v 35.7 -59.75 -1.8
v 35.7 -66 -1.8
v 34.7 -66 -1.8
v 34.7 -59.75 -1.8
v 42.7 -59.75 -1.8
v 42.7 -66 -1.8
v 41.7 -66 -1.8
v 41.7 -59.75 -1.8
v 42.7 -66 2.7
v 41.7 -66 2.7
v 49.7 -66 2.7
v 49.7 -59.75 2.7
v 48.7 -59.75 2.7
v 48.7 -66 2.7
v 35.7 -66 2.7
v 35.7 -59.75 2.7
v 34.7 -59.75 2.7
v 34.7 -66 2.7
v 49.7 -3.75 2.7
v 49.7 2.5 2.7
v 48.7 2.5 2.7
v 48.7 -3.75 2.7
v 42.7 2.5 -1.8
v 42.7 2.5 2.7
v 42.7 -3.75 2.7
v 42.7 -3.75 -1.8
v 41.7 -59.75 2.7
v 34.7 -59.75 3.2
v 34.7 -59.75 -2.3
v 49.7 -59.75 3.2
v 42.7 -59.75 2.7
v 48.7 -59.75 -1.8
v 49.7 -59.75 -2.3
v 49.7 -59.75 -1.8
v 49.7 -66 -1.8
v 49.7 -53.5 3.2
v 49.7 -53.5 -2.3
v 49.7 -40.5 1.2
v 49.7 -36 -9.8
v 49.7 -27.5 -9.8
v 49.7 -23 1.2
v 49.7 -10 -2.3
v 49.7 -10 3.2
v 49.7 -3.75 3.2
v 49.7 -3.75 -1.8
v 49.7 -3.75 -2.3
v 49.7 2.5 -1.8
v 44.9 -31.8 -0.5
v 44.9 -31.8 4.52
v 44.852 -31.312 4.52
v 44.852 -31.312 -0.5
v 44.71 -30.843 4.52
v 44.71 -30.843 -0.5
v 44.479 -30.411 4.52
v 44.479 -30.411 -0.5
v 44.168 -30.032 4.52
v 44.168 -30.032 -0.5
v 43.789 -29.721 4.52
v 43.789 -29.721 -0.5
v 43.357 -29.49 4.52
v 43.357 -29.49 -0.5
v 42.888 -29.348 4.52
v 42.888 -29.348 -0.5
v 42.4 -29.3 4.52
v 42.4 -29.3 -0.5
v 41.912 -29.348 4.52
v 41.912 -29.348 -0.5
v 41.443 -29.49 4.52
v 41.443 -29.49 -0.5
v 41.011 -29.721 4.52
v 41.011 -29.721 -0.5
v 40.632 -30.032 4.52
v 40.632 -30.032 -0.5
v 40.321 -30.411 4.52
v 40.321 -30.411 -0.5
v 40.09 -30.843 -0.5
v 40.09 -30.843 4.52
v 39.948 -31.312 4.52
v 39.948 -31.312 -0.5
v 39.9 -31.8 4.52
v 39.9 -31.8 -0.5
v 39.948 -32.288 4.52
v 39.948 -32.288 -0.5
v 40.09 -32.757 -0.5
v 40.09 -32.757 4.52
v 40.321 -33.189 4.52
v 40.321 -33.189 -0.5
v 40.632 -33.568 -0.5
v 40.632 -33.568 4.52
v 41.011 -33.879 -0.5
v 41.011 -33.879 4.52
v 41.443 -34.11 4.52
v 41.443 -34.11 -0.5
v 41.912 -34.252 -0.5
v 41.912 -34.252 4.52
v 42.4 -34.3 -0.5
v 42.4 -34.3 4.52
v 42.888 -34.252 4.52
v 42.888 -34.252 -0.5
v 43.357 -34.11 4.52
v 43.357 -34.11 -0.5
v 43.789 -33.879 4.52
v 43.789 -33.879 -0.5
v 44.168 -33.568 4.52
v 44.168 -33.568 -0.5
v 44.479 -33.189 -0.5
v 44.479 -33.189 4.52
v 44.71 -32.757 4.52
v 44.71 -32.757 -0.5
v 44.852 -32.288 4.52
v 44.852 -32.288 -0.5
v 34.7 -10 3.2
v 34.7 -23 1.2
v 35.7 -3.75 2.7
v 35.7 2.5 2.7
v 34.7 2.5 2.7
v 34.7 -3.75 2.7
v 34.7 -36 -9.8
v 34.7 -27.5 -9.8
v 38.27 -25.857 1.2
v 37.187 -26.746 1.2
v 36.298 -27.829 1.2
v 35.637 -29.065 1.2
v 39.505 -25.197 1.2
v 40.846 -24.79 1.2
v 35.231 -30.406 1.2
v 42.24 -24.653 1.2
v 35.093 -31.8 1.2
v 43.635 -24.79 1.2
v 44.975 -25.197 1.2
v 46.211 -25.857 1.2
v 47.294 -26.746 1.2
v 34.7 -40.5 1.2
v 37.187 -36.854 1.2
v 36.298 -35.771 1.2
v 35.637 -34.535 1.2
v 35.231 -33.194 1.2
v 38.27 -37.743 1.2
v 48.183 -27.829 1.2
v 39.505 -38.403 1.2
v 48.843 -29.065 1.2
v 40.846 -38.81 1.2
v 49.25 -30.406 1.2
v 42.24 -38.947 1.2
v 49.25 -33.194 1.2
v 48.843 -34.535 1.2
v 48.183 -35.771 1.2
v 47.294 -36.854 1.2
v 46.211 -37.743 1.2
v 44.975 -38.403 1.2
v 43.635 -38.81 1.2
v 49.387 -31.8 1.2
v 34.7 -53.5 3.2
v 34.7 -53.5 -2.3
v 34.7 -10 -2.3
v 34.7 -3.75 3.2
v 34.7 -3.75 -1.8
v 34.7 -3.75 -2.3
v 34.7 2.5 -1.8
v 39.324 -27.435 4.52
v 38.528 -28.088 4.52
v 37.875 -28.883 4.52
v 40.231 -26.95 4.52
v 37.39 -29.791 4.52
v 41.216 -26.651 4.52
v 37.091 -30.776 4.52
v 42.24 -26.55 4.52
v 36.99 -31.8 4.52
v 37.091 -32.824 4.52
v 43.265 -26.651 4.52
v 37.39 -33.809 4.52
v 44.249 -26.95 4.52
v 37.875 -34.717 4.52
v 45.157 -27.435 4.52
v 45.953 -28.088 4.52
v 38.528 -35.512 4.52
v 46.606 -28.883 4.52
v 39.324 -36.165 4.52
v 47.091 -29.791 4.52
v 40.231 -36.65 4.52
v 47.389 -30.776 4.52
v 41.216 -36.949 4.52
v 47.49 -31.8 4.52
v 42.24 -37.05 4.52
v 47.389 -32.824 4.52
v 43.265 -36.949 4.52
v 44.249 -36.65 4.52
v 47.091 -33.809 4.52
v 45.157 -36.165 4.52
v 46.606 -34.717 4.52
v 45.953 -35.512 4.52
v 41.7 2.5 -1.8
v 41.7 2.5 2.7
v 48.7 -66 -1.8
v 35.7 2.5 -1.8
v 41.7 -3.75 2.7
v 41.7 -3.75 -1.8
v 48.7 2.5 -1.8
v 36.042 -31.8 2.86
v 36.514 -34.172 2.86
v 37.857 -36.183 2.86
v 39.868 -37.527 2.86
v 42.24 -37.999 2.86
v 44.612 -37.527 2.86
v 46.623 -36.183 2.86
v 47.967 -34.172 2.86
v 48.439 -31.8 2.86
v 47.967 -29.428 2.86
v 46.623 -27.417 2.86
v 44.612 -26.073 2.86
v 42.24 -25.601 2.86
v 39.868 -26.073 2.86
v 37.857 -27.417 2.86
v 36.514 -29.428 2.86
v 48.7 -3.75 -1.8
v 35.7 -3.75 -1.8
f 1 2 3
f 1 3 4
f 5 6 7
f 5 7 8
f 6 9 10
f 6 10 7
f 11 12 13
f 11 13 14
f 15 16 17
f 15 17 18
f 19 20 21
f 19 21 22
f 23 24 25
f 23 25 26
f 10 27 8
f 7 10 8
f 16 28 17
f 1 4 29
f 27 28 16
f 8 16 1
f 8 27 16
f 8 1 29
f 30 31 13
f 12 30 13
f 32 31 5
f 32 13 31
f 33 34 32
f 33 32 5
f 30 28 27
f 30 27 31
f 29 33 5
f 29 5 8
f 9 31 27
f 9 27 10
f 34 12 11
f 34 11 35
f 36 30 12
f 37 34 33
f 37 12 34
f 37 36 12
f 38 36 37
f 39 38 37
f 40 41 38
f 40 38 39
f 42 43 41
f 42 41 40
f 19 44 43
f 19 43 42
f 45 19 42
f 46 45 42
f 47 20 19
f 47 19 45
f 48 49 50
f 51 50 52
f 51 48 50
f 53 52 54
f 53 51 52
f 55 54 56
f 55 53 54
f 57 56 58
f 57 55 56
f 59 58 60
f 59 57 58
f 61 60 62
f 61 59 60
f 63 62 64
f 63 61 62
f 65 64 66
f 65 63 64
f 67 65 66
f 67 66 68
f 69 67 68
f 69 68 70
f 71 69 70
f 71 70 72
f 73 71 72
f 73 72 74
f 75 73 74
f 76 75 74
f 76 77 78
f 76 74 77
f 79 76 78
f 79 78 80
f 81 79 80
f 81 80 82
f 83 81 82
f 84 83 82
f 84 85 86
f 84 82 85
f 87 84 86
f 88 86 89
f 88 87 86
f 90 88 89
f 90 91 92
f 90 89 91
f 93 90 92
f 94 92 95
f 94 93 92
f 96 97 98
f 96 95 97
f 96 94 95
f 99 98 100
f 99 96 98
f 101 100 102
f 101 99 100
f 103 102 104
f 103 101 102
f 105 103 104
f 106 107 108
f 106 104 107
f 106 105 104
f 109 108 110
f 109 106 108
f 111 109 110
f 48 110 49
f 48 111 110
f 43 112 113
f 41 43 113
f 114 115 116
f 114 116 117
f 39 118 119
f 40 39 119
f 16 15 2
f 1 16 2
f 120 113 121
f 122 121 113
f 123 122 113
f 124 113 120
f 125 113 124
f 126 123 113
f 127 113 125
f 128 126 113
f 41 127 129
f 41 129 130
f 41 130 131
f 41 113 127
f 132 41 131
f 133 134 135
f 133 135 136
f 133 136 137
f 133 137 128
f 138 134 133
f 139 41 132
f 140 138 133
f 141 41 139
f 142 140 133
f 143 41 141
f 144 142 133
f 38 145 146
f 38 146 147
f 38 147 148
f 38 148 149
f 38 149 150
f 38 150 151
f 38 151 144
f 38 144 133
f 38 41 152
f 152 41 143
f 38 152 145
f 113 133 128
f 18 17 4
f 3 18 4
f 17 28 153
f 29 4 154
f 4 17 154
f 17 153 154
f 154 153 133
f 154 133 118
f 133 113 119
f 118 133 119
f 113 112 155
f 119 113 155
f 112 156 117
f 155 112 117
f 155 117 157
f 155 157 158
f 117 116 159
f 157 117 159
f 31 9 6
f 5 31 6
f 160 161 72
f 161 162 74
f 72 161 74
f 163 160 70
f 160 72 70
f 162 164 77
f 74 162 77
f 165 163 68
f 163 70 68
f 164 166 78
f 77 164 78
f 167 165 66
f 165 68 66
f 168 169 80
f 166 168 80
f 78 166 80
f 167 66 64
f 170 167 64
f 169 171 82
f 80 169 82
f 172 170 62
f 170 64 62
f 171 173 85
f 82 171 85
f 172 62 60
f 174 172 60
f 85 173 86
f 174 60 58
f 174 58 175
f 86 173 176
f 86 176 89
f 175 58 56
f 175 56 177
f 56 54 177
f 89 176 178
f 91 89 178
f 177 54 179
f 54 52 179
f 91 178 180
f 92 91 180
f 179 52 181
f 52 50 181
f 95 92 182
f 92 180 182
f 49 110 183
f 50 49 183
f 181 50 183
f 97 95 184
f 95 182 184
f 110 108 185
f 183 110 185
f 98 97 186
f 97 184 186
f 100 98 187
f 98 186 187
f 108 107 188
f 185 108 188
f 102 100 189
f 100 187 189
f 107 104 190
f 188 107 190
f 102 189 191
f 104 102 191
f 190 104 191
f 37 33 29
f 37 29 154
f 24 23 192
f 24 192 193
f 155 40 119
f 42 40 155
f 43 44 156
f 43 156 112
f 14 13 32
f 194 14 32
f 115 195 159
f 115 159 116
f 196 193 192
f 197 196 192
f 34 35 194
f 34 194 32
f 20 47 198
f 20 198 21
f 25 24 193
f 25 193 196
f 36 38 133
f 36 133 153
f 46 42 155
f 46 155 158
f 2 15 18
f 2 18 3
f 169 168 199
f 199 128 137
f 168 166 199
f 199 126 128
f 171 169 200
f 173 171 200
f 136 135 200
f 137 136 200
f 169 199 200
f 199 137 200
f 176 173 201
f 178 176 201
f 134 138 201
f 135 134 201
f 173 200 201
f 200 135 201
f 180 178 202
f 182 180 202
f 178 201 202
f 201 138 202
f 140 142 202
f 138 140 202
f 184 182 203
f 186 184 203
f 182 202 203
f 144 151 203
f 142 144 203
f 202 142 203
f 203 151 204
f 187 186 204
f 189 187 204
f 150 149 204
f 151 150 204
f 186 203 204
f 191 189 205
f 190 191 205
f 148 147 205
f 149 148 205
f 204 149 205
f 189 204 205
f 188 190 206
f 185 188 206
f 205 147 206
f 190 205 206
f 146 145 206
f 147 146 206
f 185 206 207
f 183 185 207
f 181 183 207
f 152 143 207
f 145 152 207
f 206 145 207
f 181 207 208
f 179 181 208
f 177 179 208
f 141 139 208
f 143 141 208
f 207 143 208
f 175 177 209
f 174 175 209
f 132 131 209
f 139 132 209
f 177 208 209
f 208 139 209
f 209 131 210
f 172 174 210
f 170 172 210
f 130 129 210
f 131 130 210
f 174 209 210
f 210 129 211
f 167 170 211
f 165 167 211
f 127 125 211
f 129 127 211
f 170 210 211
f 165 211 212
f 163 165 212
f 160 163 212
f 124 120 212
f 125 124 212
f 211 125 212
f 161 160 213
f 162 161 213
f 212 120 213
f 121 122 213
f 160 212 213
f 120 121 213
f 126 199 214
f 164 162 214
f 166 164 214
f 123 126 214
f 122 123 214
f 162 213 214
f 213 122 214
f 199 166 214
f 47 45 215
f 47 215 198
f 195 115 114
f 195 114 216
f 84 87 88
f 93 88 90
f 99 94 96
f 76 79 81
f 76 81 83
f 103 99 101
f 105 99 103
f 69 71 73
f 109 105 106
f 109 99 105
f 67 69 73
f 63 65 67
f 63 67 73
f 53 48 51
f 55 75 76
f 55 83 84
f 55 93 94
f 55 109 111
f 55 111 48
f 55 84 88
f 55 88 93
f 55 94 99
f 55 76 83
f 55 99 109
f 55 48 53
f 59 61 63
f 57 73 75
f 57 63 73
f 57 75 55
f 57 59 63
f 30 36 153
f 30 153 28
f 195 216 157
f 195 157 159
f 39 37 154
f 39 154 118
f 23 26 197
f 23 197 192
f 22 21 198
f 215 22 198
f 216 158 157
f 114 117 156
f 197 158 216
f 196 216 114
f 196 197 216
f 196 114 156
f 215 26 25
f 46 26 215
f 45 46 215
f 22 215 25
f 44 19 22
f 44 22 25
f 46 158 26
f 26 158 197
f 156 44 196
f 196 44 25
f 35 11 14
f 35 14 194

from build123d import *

# Parameters (mm, degrees)
CYLINDER_R                 = 2.5
CYLINDER_DEPTH             = 6
EXTRUDE024_DEPTH           = 6
EXTRUDE024_PLACEMENT_ANGLE = 90
EXTRUDE023_DEPTH           = 1
EXTRUDE023_PLACEMENT_ANGLE = 90
EXTRUDE025_DEPTH           = 6
EXTRUDE025_PLACEMENT_ANGLE = 90
EXTRUDE_DEPTH              = 1
EXTRUDE_PLACEMENT_ANGLE    = 90
REVOLVE_PLACEMENT_ANGLE    = 90
EXTRUDE022_DEPTH           = 1
EXTRUDE022_PLACEMENT_ANGLE = 90


with BuildPart() as cylinder:
    # Cylinder → Cylinder (new body)
    with BuildSketch(Plane(origin=(42.4, -33.3, -0.5), x_dir=(1, 0, 0), z_dir=(0, 0, 1))):
        Circle(CYLINDER_R)
    extrude(amount=CYLINDER_DEPTH)


with BuildPart() as extrude024:
    # Sketch016 → Extrude024 (new body)
    with BuildSketch(Plane.YZ):
        Polygon((5.5, -12.57), (3.5, -25.57), (3.5, -43.07), (5.5, -56.07), (5.5, -62.32), (0, -62.32), (0, -56.07), (-7.5, -38.57), (-7.5, -30.07), (0, -12.57), (0, -6.32), (5.5, -6.32), align=None)
    extrude(amount=EXTRUDE024_DEPTH)


with BuildPart() as extrude024_1:
    # Extrude024 placement: moved
    add(extrude024.part.moved(Location((35.7, -67.57, -2.3))).rotate(Axis((35.7, -67.57, -2.3), (1, 0, 0)), EXTRUDE024_PLACEMENT_ANGLE))


with BuildPart() as extrude023:
    # Sketch002 → Extrude023 (new body)
    with BuildSketch(Plane.XY):
        Polygon((5.5, -12.5), (3.5, -25.5), (3.5, -43), (5.5, -56), (5.5, -62.25), (5, -62.25), (5, -68.5), (0.5, -68.5), (0.5, -62.25), (0, -62.25), (0, -56), (-7.5, -38.5), (-7.5, -30), (0, -12.5), (0, -6.25), (0.5, -6.25), (0.5, 0), (5, 0), (5, -6.25), (5.5, -6.25), align=None)
    extrude(amount=EXTRUDE023_DEPTH)


with BuildPart() as extrude023_1:
    # Extrude023 placement: moved
    add(extrude023.part.moved(Location((42.7, 1, -2.3))).rotate(Axis((42.7, 1, -2.3), (0, -1, 0)), EXTRUDE023_PLACEMENT_ANGLE))


with BuildPart() as extrude025:
    # Sketch016 → Extrude025 (new body)
    with BuildSketch(Plane.YZ):
        Polygon((5.5, -12.57), (3.5, -25.57), (3.5, -43.07), (5.5, -56.07), (5.5, -62.32), (0, -62.32), (0, -56.07), (-7.5, -38.57), (-7.5, -30.07), (0, -12.57), (0, -6.32), (5.5, -6.32), align=None)
    extrude(amount=EXTRUDE025_DEPTH)


with BuildPart() as extrude025_1:
    # Extrude025 placement: moved
    add(extrude025.part.moved(Location((42.7, -67.57, -2.3))).rotate(Axis((42.7, -67.57, -2.3), (1, 0, 0)), EXTRUDE025_PLACEMENT_ANGLE))


with BuildPart() as extrude_body:
    # Sketch002 → Extrude (new body)
    with BuildSketch(Plane.XY):
        Polygon((5.5, -12.5), (3.5, -25.5), (3.5, -43), (5.5, -56), (5.5, -62.25), (5, -62.25), (5, -68.5), (0.5, -68.5), (0.5, -62.25), (0, -62.25), (0, -56), (-7.5, -38.5), (-7.5, -30), (0, -12.5), (0, -6.25), (0.5, -6.25), (0.5, 0), (5, 0), (5, -6.25), (5.5, -6.25), align=None)
    extrude(amount=EXTRUDE_DEPTH)


with BuildPart() as extrude_body_1:
    # Extrude placement: moved
    add(extrude_body.part.moved(Location((49.7, 1, -2.3))).rotate(Axis((49.7, 1, -2.3), (0, -1, 0)), EXTRUDE_PLACEMENT_ANGLE))


with BuildPart() as revolve_body:
    # Sketch003 → Revolve (revolve)
    with BuildSketch(Plane.XZ):
        Polygon((1.919868, -28.090362), (1.919868, -35.340362), (5.419868, -35.340362), (5.419868, -30.090362), align=None)
    revolve(axis=Axis((5.419868, 0, -35.340362), (1, 0, 0)))


with BuildPart() as revolve_body_1:
    # Revolve placement: moved
    add(revolve_body.part.moved(Location((6.9, -33.3, -0.9))).rotate(Axis((6.9, -33.3, -0.9), (0, -1, 0)), REVOLVE_PLACEMENT_ANGLE))


with BuildPart() as quertraeger:
    # Sketch002 → Extrude022 (new body)
    with BuildSketch(Plane.XY):
        Polygon((5.5, -12.5), (3.5, -25.5), (3.5, -43), (5.5, -56), (5.5, -62.25), (5, -62.25), (5, -68.5), (0.5, -68.5), (0.5, -62.25), (0, -62.25), (0, -56), (-7.5, -38.5), (-7.5, -30), (0, -12.5), (0, -6.25), (0.5, -6.25), (0.5, 0), (5, 0), (5, -6.25), (5.5, -6.25), align=None)
    extrude(amount=EXTRUDE022_DEPTH)


with BuildPart() as quertraeger_1:
    # Extrude022 placement: moved
    add(quertraeger.part.moved(Location((35.7, 1, -2.3))).rotate(Axis((35.7, 1, -2.3), (0, -1, 0)), EXTRUDE022_PLACEMENT_ANGLE))

    # Fusion: union Revolve body
    add(revolve_body_1.part)

    # Fusion057: union Extrude024, Extrude023, Extrude025, Extrude body
    add(extrude024_1.part)
    add(extrude023_1.part)
    add(extrude025_1.part)
    add(extrude_body_1.part)

    # Cut064: cut Cylinder
    add(cylinder.part, mode=Mode.SUBTRACT)


with BuildPart() as quertraeger_2:
    # Cut064 placement: moved
    add(quertraeger_1.part.moved(Location((0, 1.5, 0))))


solid = quertraeger_2.part
